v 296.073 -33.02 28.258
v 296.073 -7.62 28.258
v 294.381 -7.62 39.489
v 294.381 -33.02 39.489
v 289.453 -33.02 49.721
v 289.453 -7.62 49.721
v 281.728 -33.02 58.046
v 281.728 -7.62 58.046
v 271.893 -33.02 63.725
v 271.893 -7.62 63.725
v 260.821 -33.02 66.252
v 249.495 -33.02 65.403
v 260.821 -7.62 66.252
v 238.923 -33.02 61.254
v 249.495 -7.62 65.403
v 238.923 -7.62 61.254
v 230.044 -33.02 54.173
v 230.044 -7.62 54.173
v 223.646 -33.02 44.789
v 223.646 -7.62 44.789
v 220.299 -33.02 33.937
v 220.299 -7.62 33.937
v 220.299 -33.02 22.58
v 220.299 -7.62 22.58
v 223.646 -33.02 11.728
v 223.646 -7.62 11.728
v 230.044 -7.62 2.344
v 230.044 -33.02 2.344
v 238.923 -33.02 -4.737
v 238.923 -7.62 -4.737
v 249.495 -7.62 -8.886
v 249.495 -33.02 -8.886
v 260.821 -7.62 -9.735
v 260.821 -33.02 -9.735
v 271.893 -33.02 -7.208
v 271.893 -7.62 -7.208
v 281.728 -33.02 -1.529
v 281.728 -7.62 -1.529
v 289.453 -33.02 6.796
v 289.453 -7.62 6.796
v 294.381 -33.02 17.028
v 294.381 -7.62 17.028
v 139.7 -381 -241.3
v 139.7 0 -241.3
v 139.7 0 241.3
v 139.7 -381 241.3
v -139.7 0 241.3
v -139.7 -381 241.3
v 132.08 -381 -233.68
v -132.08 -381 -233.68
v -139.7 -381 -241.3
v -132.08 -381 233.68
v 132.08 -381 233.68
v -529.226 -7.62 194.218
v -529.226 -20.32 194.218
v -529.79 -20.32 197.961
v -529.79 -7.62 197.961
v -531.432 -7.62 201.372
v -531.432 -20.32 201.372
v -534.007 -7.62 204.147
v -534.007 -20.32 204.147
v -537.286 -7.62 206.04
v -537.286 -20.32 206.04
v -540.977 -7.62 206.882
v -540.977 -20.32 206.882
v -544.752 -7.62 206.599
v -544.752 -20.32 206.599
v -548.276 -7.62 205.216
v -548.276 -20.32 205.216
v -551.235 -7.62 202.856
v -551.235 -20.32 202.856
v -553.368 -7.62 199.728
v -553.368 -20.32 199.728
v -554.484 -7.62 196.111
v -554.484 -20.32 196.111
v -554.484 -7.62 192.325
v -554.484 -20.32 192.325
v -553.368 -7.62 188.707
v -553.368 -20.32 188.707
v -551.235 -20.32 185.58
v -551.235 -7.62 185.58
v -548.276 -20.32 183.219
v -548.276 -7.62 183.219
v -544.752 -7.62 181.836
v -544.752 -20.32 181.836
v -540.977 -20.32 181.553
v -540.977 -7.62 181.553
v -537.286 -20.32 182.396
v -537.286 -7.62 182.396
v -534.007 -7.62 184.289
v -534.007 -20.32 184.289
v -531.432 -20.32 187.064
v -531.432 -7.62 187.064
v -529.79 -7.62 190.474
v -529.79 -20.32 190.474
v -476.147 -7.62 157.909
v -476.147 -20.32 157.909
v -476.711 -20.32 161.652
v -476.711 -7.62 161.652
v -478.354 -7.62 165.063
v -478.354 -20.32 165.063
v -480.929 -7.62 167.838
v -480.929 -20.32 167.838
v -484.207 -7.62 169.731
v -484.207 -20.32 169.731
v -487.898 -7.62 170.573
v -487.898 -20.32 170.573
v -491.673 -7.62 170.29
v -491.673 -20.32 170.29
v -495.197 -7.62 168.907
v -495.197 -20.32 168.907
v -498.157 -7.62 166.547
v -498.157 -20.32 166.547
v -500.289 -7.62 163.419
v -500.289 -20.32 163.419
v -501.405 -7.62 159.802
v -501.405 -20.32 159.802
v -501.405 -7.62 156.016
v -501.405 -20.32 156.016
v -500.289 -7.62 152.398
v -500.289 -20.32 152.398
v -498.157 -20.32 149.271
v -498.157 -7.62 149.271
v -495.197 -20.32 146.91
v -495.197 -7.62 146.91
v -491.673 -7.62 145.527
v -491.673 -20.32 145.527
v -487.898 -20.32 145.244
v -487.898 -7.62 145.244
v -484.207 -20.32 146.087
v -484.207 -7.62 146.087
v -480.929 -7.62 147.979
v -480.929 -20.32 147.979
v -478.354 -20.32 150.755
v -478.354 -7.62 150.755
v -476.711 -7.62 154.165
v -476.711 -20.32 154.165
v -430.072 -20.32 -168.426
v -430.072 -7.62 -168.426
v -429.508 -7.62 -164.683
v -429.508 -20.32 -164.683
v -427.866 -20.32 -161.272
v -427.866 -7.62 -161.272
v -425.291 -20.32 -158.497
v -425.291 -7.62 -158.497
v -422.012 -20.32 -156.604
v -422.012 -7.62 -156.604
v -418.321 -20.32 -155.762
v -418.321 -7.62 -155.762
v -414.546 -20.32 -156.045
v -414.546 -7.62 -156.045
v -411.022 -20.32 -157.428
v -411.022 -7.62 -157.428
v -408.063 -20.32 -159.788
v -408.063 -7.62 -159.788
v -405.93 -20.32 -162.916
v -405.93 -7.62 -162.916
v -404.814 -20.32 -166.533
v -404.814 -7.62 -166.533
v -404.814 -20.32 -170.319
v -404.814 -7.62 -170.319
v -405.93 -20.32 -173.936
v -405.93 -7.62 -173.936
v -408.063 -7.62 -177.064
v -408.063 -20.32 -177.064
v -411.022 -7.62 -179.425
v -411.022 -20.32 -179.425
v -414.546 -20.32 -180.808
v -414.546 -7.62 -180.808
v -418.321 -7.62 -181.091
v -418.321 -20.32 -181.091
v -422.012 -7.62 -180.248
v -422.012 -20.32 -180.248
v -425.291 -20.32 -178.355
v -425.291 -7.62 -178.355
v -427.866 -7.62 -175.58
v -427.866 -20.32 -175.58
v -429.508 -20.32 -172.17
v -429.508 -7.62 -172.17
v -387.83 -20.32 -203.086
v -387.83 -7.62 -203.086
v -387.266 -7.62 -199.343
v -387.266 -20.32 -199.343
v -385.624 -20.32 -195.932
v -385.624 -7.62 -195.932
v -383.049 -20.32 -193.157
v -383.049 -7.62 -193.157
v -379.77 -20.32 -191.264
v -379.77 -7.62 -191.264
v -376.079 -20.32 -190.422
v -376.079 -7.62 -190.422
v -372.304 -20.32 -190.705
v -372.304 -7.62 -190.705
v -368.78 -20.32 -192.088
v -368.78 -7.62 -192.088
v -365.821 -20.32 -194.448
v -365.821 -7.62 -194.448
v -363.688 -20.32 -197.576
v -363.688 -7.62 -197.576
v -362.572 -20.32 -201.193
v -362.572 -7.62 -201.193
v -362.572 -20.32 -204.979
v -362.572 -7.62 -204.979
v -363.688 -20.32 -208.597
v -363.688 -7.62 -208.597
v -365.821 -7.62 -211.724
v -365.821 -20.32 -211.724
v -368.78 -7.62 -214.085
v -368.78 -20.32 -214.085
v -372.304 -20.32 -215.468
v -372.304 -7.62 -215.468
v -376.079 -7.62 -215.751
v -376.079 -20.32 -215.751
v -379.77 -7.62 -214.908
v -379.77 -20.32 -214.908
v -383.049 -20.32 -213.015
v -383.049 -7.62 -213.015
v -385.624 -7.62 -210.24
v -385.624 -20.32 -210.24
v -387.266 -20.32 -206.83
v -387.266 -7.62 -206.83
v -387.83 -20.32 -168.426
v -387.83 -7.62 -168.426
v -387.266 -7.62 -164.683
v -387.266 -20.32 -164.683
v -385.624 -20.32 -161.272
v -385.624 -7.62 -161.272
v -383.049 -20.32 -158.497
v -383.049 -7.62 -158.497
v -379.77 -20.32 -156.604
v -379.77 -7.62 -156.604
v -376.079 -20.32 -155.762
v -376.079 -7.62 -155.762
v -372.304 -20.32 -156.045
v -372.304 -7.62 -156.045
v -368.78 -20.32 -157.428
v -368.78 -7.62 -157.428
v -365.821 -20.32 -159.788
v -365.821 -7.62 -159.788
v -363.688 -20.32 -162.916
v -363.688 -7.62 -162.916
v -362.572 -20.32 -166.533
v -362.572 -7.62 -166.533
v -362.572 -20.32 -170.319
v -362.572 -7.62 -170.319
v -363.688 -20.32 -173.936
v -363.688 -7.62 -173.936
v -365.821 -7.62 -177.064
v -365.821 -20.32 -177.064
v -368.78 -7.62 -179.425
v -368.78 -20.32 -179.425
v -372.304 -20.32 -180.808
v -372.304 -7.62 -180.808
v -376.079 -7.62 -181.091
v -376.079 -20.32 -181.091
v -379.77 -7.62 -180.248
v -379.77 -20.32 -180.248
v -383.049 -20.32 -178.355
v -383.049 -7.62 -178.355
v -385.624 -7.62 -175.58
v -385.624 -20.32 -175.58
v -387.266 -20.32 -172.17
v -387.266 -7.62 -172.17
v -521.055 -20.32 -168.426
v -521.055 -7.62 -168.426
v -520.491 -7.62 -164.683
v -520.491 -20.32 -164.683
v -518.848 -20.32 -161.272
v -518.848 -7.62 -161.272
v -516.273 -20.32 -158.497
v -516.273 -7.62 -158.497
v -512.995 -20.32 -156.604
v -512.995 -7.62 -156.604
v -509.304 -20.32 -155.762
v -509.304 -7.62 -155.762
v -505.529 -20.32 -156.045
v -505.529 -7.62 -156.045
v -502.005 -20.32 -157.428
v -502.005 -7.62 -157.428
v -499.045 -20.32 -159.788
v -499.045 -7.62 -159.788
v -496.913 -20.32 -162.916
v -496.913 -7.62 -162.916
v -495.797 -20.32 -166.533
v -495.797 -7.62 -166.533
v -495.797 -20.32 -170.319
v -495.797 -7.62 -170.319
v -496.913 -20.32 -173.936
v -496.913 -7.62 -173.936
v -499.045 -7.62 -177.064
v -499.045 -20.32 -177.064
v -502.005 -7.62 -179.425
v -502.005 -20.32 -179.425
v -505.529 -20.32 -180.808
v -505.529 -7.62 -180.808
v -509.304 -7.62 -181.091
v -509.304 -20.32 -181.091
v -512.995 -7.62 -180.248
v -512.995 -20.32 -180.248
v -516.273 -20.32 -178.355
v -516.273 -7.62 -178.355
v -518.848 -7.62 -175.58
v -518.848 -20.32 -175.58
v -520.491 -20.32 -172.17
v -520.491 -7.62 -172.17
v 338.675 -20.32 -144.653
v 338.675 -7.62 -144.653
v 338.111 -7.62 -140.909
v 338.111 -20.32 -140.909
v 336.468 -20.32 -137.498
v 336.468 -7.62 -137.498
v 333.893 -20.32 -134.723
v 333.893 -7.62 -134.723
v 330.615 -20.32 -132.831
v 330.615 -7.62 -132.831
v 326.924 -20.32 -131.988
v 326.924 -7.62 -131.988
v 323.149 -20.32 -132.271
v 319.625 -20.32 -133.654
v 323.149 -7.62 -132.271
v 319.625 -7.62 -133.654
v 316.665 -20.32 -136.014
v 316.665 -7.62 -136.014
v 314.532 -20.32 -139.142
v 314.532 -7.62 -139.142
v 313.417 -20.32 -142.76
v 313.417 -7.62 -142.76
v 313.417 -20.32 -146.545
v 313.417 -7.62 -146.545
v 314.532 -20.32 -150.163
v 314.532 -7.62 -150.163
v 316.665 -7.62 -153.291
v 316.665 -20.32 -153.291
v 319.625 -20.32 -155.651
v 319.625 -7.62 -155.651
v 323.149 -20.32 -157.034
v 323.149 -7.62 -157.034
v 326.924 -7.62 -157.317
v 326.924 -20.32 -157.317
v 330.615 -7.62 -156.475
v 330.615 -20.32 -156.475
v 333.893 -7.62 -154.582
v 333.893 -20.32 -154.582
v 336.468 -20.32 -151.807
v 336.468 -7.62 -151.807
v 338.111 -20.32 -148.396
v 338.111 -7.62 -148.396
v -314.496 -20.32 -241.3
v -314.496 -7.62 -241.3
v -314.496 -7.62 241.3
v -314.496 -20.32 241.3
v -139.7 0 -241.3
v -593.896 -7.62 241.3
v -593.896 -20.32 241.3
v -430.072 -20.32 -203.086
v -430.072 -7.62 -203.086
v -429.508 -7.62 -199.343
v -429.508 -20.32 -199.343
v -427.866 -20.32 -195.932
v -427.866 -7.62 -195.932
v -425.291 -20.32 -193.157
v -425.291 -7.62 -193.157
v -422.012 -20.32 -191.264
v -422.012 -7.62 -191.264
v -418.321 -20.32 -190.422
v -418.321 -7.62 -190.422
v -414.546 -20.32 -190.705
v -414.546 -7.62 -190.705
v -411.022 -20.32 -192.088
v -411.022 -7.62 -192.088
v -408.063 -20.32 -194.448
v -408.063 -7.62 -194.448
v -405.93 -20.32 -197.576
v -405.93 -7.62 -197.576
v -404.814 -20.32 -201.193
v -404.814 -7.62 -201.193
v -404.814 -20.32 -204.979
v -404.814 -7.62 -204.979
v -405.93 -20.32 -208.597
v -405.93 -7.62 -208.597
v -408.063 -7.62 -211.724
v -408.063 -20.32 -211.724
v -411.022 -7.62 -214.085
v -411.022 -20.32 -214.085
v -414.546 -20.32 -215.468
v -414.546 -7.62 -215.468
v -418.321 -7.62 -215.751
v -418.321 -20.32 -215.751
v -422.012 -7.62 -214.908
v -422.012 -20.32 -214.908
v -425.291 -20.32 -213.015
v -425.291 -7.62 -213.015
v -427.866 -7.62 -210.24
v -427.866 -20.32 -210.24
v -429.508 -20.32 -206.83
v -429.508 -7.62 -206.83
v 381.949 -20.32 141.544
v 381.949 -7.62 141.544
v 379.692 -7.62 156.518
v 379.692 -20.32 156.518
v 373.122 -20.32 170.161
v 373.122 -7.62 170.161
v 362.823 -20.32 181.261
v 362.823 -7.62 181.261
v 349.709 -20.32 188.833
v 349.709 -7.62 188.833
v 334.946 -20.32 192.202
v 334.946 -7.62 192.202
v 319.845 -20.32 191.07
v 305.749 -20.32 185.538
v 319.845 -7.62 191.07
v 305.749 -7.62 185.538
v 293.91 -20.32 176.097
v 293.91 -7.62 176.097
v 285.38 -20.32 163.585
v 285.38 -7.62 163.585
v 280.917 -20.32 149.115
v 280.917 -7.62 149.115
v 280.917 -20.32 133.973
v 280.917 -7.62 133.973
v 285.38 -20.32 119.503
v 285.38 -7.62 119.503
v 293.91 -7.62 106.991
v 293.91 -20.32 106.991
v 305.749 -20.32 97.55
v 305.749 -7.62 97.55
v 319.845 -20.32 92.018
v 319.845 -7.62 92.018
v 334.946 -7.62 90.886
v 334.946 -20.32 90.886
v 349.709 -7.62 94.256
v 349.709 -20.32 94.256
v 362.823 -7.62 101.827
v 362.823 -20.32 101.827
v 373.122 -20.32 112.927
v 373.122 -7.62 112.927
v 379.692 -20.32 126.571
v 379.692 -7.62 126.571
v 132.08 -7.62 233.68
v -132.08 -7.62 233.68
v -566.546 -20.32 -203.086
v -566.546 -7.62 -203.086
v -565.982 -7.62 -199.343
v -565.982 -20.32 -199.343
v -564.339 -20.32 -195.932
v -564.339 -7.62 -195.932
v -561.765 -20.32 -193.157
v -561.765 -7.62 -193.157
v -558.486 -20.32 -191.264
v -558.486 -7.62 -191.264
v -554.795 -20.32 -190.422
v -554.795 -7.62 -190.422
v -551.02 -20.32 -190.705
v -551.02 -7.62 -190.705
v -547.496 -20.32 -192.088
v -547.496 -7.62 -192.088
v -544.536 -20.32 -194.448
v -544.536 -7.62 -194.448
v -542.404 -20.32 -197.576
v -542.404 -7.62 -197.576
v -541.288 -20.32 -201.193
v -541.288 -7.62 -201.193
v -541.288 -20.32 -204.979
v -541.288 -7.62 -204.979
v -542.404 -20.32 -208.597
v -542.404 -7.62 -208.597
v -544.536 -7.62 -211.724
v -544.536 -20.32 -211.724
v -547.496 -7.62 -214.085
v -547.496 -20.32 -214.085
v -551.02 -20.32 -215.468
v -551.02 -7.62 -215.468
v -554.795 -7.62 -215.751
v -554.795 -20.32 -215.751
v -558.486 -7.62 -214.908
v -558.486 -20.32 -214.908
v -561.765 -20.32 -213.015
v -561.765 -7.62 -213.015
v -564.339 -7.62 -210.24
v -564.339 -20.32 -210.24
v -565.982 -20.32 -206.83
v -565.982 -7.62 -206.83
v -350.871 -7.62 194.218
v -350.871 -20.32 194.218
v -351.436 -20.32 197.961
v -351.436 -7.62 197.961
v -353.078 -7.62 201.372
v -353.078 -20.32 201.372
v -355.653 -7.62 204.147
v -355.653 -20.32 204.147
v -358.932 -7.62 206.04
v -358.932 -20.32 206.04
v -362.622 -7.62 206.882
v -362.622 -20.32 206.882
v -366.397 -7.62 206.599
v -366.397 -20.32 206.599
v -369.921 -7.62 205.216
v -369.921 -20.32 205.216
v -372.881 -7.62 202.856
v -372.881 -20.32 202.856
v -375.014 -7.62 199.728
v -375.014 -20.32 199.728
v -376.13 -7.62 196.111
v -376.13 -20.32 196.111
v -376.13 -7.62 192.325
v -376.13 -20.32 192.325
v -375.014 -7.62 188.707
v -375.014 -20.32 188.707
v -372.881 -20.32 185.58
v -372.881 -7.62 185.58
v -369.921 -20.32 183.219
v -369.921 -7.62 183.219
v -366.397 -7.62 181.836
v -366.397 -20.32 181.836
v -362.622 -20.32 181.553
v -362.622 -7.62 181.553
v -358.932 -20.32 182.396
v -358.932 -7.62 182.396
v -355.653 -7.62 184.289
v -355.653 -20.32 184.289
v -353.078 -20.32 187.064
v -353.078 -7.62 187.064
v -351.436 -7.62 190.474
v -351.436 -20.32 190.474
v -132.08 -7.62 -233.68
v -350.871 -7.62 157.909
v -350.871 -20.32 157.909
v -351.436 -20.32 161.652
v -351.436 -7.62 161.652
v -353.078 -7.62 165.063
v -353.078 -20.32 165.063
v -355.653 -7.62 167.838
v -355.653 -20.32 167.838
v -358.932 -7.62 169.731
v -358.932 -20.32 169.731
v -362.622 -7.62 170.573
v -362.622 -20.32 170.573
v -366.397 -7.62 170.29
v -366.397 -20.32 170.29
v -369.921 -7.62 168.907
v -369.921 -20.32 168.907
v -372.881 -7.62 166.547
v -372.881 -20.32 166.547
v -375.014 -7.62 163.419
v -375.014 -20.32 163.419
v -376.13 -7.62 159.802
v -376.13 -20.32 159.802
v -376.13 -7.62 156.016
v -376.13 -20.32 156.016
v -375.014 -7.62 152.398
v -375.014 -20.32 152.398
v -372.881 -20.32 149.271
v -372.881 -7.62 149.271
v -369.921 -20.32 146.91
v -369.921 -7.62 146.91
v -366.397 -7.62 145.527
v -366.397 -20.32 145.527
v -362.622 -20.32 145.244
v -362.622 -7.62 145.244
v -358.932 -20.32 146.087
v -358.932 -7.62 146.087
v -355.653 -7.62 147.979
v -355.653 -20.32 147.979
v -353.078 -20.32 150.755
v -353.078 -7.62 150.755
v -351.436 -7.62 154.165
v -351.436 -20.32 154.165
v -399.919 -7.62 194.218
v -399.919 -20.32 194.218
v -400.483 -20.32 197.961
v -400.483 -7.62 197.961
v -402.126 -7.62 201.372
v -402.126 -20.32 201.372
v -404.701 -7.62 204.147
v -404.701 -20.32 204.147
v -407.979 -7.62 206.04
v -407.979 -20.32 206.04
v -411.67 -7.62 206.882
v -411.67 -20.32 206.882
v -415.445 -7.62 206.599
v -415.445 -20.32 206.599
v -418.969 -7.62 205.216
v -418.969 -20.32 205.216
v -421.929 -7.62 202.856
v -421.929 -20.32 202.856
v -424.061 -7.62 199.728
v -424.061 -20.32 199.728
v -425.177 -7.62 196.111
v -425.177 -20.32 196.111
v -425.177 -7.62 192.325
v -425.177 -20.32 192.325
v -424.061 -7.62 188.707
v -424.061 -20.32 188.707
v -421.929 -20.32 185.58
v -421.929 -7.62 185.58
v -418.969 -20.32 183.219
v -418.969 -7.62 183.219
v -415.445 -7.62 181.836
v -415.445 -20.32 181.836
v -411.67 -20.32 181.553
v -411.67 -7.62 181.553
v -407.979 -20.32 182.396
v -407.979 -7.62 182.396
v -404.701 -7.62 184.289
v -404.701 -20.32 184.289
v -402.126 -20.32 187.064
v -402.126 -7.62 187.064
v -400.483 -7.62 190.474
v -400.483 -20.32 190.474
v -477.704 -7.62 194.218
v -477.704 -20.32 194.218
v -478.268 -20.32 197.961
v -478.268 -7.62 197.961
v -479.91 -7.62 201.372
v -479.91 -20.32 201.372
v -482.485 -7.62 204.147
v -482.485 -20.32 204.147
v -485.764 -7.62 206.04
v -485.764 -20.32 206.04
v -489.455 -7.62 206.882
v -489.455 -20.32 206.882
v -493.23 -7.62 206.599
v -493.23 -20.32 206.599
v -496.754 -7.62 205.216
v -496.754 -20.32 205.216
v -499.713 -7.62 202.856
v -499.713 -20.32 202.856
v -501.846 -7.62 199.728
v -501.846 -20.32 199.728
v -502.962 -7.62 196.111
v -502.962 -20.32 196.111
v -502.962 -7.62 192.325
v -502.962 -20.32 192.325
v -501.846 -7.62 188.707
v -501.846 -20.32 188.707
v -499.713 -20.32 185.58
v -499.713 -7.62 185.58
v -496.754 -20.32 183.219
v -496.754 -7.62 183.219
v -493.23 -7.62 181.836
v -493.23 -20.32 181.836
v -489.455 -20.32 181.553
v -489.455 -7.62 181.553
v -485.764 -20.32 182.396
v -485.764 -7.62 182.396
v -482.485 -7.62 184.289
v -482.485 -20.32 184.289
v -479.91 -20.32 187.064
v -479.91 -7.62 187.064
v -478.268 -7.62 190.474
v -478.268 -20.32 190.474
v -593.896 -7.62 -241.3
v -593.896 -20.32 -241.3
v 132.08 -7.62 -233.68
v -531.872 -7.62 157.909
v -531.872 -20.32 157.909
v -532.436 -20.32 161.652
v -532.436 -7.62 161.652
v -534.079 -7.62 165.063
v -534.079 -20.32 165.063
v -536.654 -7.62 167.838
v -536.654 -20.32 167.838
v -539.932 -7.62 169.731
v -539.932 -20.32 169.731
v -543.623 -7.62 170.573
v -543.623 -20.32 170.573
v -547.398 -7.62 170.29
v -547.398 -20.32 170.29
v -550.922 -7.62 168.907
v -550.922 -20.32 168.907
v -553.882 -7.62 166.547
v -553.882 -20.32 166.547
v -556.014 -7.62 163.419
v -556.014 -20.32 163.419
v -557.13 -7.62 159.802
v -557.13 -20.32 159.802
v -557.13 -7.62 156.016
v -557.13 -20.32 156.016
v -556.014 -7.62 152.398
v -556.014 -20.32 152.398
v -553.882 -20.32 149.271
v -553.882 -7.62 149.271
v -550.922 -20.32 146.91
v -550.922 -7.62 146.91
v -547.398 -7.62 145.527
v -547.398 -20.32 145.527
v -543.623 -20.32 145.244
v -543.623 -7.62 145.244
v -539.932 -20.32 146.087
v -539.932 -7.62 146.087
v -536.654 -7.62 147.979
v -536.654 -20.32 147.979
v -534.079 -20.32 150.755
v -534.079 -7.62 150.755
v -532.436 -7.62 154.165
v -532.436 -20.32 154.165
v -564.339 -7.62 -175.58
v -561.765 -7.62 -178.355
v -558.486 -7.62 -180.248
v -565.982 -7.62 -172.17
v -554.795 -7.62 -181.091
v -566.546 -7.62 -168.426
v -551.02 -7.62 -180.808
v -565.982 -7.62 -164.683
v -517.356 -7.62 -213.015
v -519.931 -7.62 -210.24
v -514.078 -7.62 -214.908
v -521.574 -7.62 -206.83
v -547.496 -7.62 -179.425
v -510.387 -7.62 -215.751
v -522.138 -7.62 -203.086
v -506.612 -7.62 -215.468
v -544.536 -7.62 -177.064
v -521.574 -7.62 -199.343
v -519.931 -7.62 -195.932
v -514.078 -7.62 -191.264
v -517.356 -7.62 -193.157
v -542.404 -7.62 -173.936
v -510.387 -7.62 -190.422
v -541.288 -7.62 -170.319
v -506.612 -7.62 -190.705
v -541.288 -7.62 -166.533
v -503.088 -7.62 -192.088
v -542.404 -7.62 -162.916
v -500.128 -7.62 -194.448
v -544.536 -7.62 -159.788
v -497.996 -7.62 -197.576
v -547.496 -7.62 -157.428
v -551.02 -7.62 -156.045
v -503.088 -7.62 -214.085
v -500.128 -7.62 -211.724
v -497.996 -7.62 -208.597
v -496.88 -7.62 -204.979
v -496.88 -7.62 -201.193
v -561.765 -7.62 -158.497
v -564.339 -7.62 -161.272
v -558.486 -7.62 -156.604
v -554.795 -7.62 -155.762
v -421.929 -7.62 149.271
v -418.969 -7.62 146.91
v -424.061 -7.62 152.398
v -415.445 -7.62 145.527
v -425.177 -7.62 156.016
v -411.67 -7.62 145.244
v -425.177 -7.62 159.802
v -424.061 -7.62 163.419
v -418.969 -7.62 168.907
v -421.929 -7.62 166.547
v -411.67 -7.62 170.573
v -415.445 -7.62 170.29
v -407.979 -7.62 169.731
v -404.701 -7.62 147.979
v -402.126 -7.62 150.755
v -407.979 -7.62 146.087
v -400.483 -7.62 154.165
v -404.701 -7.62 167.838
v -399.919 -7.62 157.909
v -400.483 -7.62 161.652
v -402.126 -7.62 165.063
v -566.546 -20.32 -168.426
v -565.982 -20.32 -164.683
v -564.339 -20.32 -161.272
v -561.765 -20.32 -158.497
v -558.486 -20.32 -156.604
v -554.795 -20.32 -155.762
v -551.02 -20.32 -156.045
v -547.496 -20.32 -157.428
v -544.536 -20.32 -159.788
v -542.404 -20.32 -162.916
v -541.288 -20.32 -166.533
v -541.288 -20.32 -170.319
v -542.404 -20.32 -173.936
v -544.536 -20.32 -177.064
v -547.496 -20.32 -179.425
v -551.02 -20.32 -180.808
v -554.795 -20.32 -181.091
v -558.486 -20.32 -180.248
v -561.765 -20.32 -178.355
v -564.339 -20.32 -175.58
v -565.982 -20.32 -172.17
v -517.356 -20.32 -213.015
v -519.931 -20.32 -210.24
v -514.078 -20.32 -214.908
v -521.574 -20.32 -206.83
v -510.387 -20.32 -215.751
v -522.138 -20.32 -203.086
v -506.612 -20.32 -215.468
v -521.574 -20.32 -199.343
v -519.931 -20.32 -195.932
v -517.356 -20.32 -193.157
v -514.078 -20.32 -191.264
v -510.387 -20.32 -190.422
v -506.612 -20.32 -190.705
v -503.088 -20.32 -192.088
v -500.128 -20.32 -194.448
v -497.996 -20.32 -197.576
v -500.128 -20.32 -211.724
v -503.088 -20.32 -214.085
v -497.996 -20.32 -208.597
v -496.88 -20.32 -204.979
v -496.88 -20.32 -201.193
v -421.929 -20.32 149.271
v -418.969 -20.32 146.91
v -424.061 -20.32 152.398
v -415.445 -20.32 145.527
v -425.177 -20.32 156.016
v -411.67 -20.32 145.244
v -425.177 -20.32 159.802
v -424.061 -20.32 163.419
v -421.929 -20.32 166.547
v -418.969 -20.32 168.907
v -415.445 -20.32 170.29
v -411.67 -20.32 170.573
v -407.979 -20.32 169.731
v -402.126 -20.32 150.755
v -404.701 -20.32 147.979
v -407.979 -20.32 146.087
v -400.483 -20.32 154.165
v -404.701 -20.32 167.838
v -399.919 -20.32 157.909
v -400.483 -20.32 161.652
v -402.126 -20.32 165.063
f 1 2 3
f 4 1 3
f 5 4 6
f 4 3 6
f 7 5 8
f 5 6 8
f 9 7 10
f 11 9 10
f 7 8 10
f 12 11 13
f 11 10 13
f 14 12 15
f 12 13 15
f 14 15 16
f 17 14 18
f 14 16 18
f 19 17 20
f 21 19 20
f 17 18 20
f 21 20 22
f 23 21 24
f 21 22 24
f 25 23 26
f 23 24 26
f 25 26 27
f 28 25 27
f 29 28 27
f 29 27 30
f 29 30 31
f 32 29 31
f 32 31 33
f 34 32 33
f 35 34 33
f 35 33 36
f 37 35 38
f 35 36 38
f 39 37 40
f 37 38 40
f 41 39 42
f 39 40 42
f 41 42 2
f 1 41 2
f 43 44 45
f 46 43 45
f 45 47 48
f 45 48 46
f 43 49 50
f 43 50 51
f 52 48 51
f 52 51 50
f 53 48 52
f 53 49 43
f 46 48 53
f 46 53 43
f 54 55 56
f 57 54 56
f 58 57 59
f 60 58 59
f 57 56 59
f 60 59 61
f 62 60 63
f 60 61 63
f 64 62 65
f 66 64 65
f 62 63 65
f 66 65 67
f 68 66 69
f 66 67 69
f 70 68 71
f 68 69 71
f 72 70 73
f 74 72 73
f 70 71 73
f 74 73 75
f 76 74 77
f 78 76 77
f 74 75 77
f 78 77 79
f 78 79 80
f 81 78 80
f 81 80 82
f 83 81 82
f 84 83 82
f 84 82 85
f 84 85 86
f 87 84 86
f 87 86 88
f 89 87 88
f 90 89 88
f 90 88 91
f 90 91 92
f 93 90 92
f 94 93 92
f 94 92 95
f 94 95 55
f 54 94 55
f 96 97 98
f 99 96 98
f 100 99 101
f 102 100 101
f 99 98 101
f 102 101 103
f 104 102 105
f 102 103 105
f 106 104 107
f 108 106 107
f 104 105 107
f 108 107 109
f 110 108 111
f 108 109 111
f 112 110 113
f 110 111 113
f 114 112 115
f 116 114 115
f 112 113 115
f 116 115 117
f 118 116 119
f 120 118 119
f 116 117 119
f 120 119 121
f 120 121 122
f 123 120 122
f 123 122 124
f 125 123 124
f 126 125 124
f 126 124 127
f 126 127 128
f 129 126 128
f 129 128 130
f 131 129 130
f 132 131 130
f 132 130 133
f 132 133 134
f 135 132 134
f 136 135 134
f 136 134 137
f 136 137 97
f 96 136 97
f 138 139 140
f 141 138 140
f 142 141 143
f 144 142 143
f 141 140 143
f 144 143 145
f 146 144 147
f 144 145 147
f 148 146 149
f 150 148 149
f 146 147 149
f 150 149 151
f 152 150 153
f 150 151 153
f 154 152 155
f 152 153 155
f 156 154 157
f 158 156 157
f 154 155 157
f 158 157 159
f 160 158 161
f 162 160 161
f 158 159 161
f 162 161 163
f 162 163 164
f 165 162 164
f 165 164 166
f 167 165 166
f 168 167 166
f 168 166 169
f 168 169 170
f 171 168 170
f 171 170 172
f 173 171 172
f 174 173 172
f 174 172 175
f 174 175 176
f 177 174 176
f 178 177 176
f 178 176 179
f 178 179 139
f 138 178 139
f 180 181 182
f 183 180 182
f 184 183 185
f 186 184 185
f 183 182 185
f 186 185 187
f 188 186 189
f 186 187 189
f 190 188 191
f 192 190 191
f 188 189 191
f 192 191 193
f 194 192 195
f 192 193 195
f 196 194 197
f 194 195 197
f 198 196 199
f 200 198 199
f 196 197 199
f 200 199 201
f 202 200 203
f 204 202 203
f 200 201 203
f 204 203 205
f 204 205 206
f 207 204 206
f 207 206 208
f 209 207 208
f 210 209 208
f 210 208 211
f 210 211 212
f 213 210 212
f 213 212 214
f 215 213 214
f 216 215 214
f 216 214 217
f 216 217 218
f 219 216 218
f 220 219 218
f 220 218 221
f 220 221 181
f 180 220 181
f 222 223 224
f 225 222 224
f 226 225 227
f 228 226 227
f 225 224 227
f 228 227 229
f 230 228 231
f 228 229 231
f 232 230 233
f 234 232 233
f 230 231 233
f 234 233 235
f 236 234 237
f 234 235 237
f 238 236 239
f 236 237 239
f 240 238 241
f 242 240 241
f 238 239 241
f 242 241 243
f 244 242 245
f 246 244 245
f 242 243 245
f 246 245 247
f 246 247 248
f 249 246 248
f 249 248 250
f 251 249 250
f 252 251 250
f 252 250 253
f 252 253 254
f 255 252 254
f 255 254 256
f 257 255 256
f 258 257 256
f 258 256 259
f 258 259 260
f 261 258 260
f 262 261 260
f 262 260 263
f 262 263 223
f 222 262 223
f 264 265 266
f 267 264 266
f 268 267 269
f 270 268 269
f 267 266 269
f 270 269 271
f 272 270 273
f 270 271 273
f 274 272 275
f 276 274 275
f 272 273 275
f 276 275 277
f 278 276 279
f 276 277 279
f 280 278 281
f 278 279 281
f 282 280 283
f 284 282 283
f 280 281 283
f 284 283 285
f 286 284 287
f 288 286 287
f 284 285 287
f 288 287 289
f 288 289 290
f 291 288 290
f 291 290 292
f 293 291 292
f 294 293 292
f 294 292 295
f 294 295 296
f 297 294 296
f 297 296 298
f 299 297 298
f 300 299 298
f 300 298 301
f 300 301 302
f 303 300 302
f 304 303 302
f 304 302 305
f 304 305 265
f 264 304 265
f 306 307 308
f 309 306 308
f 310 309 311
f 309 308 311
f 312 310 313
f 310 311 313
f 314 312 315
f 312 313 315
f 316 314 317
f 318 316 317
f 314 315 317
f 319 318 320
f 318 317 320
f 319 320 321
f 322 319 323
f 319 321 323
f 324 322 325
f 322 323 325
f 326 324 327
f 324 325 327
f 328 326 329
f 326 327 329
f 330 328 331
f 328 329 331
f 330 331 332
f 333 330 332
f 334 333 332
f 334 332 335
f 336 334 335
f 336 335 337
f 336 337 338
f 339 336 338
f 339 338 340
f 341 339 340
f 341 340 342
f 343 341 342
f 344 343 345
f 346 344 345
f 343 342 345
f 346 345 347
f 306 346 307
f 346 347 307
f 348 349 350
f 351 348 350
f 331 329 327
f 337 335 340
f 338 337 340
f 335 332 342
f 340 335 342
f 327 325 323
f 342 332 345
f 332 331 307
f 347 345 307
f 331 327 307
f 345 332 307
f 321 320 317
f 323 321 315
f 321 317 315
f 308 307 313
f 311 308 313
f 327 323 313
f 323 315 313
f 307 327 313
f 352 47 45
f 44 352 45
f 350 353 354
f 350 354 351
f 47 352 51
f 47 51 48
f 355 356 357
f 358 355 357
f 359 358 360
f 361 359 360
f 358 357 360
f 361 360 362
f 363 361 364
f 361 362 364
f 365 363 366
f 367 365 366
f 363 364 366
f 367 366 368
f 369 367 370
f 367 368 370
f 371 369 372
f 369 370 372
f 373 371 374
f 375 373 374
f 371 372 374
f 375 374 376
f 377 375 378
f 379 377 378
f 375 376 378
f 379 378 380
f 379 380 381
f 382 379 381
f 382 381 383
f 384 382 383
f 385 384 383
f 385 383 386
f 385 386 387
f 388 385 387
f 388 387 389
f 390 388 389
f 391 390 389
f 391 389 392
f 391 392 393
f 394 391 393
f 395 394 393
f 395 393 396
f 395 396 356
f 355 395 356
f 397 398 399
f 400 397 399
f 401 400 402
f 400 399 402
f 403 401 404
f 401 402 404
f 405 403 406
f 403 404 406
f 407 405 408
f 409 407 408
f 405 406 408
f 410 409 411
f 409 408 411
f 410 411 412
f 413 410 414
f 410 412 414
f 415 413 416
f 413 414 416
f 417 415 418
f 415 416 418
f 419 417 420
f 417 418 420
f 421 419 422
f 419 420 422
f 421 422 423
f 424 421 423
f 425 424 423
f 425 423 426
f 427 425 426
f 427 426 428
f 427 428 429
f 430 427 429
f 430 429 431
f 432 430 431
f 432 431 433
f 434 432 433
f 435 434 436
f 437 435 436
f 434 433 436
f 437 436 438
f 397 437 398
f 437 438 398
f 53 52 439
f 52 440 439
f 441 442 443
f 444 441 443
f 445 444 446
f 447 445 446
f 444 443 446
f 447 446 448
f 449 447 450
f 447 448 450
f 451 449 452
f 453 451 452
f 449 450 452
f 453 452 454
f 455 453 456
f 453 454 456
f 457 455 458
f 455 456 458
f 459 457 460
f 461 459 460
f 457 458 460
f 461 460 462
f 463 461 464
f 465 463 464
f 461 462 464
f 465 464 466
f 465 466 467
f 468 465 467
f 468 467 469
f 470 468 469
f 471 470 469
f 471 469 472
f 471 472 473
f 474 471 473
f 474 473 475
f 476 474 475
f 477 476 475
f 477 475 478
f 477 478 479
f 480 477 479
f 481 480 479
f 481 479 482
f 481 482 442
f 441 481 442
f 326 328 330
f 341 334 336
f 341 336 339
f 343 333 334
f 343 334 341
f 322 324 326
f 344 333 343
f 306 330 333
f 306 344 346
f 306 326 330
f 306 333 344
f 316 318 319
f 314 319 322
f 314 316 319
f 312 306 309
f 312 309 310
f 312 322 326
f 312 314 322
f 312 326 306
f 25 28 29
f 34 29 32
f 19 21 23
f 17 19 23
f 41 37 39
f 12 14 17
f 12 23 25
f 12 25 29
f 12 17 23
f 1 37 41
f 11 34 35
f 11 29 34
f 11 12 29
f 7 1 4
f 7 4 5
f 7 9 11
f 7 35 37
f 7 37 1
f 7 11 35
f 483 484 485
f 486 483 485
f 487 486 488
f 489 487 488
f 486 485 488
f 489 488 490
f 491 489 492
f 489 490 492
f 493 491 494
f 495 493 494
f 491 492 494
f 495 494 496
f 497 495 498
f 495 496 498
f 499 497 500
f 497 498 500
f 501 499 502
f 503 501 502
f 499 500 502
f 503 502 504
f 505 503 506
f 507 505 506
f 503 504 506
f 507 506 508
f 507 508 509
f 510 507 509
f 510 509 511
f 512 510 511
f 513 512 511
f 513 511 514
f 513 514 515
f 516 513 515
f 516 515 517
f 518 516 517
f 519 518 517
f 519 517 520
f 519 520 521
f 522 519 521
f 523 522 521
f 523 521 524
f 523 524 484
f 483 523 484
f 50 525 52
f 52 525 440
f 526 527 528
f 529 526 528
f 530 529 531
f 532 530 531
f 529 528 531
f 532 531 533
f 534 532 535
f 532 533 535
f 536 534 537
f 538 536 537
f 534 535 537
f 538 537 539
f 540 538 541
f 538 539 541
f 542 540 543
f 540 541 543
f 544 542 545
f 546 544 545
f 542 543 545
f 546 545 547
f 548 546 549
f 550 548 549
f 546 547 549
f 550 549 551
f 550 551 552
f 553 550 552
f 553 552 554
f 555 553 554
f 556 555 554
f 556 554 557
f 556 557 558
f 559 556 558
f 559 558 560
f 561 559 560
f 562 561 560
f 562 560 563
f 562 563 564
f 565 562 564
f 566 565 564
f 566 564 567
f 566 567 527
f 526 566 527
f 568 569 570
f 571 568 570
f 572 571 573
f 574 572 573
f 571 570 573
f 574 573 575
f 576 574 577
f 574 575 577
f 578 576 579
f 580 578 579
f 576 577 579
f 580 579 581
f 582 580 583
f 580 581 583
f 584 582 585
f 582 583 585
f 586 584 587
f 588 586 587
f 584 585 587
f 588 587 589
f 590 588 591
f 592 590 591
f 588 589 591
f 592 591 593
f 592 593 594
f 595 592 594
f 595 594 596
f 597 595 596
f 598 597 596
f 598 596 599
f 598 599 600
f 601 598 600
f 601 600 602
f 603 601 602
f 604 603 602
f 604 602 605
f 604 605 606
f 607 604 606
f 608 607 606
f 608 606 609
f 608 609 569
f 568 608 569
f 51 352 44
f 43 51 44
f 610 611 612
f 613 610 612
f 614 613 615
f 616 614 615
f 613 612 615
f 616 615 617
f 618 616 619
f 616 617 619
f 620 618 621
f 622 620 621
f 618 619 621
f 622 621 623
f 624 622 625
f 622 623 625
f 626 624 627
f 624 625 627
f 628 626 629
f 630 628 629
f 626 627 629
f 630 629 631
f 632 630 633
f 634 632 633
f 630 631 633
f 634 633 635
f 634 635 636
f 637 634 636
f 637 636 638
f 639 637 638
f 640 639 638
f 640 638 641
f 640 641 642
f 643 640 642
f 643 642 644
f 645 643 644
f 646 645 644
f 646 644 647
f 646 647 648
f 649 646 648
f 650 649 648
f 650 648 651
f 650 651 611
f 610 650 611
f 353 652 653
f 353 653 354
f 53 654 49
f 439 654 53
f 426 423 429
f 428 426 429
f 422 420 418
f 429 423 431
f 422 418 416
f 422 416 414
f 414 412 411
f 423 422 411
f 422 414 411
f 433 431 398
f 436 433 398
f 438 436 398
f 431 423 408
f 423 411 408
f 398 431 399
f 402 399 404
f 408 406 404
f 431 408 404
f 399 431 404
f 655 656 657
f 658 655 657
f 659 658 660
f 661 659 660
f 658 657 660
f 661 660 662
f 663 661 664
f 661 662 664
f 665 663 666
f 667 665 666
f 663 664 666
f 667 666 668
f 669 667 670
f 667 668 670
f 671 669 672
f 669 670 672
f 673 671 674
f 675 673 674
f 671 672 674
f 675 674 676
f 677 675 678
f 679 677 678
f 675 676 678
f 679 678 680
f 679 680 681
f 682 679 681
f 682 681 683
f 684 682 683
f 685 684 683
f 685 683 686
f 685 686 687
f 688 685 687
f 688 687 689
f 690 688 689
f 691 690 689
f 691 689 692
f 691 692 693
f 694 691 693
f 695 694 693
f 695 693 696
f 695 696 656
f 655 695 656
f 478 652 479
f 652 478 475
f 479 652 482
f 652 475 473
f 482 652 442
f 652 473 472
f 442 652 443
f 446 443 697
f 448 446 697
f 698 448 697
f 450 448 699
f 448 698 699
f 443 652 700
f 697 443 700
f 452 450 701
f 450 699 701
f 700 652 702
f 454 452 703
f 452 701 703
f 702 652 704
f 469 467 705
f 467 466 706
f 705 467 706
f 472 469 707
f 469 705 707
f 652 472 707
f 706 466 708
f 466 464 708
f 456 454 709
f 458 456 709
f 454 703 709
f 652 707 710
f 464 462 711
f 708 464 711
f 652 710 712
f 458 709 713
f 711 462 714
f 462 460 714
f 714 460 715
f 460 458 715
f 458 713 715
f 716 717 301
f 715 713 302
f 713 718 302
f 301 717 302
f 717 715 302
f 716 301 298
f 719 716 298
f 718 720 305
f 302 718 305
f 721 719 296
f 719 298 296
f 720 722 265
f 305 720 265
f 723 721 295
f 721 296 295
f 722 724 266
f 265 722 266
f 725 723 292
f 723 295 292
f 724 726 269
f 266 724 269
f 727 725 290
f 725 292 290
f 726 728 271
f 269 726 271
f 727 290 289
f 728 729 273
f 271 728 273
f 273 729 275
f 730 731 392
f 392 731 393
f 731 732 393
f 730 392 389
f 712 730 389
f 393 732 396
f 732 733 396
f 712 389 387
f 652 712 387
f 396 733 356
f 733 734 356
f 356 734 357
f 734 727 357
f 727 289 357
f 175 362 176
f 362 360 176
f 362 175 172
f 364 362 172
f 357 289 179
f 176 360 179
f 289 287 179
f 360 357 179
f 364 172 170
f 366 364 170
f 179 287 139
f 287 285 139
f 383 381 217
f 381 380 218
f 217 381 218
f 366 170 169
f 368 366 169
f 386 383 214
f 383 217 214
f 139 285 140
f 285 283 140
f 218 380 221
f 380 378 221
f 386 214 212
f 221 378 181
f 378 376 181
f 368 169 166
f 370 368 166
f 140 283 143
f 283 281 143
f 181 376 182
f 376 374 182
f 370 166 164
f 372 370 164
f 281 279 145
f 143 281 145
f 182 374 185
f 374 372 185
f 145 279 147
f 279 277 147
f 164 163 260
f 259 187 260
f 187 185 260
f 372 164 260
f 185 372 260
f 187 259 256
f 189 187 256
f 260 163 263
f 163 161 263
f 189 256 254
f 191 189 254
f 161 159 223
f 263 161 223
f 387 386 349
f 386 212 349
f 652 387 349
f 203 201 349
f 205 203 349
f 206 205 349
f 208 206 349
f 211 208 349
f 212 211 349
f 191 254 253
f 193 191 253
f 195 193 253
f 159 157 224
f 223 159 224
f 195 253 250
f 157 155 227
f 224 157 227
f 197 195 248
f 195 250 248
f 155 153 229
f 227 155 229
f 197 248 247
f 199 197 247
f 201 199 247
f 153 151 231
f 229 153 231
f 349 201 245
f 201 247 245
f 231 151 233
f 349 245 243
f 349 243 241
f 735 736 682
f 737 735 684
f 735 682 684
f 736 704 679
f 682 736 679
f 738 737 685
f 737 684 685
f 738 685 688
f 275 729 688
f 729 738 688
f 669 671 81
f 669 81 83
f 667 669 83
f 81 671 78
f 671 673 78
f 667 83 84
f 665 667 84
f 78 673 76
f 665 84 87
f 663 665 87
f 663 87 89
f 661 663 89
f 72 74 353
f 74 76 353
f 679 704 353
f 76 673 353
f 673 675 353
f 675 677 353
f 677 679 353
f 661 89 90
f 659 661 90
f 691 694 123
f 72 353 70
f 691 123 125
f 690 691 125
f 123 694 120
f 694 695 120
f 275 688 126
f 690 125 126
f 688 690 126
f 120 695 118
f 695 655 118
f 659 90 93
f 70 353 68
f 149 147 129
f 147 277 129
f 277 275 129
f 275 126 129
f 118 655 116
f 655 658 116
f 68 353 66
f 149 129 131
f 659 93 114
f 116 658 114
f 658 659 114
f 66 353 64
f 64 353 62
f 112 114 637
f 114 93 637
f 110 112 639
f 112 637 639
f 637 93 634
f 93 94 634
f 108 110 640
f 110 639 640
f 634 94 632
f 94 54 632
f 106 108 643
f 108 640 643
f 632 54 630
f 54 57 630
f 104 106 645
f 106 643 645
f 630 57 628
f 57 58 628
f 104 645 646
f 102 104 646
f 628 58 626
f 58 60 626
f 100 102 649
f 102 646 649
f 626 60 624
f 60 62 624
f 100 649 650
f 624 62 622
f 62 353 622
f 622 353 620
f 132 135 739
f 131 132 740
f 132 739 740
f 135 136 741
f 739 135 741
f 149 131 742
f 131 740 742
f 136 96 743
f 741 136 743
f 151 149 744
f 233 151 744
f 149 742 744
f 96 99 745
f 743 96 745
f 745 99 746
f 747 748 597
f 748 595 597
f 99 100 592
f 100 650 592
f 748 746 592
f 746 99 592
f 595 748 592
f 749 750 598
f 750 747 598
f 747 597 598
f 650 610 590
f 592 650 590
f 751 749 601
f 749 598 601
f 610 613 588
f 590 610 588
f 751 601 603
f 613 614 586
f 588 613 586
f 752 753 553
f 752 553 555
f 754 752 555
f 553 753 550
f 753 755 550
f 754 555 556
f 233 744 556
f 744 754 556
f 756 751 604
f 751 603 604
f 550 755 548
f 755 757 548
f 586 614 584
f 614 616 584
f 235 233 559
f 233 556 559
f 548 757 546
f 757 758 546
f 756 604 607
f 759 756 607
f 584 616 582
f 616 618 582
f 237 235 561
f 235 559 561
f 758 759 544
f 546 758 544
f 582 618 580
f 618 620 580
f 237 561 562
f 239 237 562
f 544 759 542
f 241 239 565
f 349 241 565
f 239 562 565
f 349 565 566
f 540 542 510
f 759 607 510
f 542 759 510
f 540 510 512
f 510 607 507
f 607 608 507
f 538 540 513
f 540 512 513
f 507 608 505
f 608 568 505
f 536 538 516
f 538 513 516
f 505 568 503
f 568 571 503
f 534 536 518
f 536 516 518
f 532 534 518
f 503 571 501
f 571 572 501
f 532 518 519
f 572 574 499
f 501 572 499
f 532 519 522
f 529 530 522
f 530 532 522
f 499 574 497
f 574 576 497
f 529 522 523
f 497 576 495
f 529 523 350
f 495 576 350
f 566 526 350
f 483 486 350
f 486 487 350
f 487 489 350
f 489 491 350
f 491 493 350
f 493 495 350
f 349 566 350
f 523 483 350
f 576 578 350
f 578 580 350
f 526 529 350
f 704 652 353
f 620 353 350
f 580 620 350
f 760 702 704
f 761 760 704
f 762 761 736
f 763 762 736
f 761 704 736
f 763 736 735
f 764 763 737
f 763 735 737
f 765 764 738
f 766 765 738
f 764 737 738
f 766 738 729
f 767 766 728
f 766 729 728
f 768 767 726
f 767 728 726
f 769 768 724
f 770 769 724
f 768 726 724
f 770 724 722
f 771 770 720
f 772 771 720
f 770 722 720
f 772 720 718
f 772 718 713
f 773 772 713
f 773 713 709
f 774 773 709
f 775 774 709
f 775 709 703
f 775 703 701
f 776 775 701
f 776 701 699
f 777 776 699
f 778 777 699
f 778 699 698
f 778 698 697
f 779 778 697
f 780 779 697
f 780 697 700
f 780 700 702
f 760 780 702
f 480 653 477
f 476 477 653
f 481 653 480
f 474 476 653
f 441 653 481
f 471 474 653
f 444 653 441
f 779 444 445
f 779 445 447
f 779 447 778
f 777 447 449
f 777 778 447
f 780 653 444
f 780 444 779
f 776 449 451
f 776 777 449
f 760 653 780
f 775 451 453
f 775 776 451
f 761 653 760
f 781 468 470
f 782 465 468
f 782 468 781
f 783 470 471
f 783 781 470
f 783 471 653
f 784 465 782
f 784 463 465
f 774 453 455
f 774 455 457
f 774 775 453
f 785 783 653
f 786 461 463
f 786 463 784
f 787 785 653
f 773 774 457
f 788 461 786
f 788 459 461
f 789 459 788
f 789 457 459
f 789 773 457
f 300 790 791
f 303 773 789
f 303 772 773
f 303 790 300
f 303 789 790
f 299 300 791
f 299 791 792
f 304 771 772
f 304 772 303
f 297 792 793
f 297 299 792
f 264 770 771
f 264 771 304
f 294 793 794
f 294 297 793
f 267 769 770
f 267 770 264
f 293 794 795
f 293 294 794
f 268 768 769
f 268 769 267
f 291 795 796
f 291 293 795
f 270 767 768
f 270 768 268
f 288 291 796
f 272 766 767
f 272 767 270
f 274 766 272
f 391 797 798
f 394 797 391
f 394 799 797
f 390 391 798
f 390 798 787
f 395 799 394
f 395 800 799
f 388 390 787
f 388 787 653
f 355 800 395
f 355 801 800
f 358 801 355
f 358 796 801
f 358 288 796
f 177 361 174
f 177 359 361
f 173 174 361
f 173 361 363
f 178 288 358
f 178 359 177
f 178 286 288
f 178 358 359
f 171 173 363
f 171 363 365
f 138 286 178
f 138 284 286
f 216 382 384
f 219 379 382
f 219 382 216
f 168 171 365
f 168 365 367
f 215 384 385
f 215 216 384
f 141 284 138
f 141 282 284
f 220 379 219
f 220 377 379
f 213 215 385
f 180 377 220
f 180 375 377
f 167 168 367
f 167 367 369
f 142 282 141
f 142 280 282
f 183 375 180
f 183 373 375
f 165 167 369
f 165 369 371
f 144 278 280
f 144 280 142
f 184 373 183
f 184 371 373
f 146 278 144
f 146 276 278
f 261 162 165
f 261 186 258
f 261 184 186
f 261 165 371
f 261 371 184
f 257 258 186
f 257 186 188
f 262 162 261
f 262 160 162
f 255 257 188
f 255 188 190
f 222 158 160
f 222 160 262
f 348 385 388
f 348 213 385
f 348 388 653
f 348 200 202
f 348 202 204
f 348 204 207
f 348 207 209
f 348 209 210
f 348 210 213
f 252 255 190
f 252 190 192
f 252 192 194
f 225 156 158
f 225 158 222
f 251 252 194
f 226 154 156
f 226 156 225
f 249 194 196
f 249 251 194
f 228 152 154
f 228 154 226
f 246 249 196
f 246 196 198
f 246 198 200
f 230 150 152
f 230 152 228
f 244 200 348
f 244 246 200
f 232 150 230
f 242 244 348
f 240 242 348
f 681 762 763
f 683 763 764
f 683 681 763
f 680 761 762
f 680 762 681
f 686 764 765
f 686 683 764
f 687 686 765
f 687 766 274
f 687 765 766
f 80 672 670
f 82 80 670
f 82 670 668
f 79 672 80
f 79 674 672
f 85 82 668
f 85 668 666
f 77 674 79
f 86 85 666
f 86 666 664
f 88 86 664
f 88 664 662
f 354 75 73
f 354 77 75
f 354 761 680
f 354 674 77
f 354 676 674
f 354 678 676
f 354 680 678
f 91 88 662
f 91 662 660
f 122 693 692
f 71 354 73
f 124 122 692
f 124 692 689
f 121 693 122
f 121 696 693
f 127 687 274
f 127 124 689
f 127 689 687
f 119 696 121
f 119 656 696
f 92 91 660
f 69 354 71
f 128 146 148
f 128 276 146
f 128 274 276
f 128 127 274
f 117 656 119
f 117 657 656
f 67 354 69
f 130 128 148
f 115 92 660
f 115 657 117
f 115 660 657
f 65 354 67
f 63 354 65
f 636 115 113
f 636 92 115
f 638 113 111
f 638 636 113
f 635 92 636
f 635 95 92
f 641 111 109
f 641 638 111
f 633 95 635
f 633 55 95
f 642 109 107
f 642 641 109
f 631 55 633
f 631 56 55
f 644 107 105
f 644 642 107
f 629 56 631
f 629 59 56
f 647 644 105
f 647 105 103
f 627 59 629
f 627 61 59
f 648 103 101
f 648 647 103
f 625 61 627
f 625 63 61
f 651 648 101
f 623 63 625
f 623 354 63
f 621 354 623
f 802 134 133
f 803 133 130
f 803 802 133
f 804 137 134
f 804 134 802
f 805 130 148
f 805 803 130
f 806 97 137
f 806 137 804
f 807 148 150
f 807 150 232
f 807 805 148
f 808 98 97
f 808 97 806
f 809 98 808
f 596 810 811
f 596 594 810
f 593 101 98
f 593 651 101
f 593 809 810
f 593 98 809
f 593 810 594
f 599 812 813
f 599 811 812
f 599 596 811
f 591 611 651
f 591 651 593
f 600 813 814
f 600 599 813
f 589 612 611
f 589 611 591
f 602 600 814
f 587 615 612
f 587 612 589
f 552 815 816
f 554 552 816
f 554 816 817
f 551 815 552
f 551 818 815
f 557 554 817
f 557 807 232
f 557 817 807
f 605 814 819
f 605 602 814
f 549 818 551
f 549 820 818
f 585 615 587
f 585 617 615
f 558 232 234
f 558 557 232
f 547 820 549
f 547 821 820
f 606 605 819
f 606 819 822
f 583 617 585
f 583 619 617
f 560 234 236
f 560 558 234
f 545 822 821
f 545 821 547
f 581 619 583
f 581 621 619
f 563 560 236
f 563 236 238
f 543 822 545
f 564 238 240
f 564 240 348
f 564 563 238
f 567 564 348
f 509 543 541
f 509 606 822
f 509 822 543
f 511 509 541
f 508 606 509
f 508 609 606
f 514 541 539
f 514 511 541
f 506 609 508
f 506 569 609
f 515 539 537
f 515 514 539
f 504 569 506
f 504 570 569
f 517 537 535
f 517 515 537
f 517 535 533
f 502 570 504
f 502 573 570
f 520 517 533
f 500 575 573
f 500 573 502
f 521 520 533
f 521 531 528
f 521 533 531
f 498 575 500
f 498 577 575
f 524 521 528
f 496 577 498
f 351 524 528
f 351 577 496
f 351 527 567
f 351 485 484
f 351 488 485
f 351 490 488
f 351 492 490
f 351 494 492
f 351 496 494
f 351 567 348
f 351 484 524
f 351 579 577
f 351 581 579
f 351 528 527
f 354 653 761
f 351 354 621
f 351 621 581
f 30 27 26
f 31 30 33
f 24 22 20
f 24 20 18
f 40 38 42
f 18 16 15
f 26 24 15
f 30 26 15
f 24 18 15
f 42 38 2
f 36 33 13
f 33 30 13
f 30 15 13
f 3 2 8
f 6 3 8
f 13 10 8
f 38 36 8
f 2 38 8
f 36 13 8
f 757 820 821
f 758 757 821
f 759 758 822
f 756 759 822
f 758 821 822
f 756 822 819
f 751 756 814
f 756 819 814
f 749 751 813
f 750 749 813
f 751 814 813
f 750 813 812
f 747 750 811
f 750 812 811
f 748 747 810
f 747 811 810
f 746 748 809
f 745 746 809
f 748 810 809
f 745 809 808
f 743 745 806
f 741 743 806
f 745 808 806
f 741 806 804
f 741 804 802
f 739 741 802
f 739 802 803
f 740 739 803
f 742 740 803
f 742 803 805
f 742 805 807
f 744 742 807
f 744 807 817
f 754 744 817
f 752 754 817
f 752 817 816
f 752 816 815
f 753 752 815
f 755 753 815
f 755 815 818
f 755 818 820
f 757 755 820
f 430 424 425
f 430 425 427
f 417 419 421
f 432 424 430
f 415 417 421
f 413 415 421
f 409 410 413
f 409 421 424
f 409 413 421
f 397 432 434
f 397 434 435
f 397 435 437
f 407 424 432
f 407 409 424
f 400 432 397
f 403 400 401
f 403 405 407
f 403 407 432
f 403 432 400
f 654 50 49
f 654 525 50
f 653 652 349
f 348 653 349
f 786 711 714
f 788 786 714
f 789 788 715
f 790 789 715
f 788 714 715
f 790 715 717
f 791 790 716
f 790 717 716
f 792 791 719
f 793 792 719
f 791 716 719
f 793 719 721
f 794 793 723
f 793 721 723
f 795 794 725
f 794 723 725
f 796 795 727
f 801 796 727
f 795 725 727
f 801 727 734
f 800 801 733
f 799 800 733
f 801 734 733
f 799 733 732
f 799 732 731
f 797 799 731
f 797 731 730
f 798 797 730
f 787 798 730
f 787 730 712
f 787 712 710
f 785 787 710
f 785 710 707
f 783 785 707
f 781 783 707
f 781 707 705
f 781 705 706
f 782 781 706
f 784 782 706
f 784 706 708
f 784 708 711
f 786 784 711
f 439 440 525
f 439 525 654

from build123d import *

# Parameters (mm, degrees)
F0_W      = 279.4
F0_H      = 482.6
F1_DEPTH  = 381
F2_T      = -7.62
F3_W      = 279.4
F3_H      = 482.6
F4_DEPTH  = 12.7
F5_R      = 38.1
F6_DEPTH  = 25.4
F7_R      = 50.8
F8_DEPTH  = 12.7
F9_R      = 12.7
F10_DEPTH = 12.7
F12_D     = 25.4
F14_D     = 25.4


with BuildPart() as f1:
    # F0 (on Front) → F1 (new body)
    with BuildSketch(Plane.XZ):
        Rectangle(F0_W, F0_H)
    extrude(amount=F1_DEPTH)

    # F2
    f2_openings = [f1.faces().sort_by_distance(p)[0] for p in [
        (0, -381, 0),
    ]]
    offset(amount=F2_T, openings=f2_openings)


with BuildPart() as f4:
    # F3 (on face) → F4 (new body)
    with BuildSketch(Plane.XZ.offset(7.62)):
        with Locations((-454.196155, 0)):
            Rectangle(F3_W, F3_H)
    extrude(amount=F4_DEPTH)

    # F12 (through all)
    with Locations(Plane(origin=(0, -7.62, 0), x_dir=(-1, 0, 0), z_dir=(0, 1, 0))):
        with Locations((363.571376, 194.217786), (412.618965, 194.217786), (412.618965, 157.908708), (363.571376, 157.908708), (488.846928, 157.908708), (544.572115, 157.908708), (541.925728, 194.217786), (490.403652, 194.217786)):
            Hole(F12_D / 2)

    # F14 (through all)
    with Locations(Plane.XZ.offset(20.32)):
        with Locations((-508.354962, -168.426171), (-553.84624, -168.426171), (-553.84624, -203.086212), (-509.438097, -203.086212), (-417.372316, -203.086212), (-375.130385, -203.086212), (-417.372316, -168.426171), (-375.130385, -168.426171)):
            Hole(F14_D / 2)


with BuildPart() as f6:
    # F5 (on face) → F6 (new body)
    with BuildSketch(Plane.XZ.offset(7.62)):
        with Locations((257.973343, 28.258491)):
            Circle(F5_R)
    extrude(amount=F6_DEPTH)


with BuildPart() as f8:
    # F7 (on face) → F8 (new body)
    with BuildSketch(Plane.XZ.offset(7.62)):
        with Locations((331.14925, 141.544148)):
            Circle(F7_R)
    extrude(amount=F8_DEPTH)


with BuildPart() as f10:
    # F9 (on face) → F10 (new body)
    with BuildSketch(Plane.XZ.offset(7.62)):
        with Locations((325.974733, -144.65262)):
            Circle(F9_R)
    extrude(amount=F10_DEPTH)


solid = Compound([f1.part, f4.part, f6.part, f8.part, f10.part])
